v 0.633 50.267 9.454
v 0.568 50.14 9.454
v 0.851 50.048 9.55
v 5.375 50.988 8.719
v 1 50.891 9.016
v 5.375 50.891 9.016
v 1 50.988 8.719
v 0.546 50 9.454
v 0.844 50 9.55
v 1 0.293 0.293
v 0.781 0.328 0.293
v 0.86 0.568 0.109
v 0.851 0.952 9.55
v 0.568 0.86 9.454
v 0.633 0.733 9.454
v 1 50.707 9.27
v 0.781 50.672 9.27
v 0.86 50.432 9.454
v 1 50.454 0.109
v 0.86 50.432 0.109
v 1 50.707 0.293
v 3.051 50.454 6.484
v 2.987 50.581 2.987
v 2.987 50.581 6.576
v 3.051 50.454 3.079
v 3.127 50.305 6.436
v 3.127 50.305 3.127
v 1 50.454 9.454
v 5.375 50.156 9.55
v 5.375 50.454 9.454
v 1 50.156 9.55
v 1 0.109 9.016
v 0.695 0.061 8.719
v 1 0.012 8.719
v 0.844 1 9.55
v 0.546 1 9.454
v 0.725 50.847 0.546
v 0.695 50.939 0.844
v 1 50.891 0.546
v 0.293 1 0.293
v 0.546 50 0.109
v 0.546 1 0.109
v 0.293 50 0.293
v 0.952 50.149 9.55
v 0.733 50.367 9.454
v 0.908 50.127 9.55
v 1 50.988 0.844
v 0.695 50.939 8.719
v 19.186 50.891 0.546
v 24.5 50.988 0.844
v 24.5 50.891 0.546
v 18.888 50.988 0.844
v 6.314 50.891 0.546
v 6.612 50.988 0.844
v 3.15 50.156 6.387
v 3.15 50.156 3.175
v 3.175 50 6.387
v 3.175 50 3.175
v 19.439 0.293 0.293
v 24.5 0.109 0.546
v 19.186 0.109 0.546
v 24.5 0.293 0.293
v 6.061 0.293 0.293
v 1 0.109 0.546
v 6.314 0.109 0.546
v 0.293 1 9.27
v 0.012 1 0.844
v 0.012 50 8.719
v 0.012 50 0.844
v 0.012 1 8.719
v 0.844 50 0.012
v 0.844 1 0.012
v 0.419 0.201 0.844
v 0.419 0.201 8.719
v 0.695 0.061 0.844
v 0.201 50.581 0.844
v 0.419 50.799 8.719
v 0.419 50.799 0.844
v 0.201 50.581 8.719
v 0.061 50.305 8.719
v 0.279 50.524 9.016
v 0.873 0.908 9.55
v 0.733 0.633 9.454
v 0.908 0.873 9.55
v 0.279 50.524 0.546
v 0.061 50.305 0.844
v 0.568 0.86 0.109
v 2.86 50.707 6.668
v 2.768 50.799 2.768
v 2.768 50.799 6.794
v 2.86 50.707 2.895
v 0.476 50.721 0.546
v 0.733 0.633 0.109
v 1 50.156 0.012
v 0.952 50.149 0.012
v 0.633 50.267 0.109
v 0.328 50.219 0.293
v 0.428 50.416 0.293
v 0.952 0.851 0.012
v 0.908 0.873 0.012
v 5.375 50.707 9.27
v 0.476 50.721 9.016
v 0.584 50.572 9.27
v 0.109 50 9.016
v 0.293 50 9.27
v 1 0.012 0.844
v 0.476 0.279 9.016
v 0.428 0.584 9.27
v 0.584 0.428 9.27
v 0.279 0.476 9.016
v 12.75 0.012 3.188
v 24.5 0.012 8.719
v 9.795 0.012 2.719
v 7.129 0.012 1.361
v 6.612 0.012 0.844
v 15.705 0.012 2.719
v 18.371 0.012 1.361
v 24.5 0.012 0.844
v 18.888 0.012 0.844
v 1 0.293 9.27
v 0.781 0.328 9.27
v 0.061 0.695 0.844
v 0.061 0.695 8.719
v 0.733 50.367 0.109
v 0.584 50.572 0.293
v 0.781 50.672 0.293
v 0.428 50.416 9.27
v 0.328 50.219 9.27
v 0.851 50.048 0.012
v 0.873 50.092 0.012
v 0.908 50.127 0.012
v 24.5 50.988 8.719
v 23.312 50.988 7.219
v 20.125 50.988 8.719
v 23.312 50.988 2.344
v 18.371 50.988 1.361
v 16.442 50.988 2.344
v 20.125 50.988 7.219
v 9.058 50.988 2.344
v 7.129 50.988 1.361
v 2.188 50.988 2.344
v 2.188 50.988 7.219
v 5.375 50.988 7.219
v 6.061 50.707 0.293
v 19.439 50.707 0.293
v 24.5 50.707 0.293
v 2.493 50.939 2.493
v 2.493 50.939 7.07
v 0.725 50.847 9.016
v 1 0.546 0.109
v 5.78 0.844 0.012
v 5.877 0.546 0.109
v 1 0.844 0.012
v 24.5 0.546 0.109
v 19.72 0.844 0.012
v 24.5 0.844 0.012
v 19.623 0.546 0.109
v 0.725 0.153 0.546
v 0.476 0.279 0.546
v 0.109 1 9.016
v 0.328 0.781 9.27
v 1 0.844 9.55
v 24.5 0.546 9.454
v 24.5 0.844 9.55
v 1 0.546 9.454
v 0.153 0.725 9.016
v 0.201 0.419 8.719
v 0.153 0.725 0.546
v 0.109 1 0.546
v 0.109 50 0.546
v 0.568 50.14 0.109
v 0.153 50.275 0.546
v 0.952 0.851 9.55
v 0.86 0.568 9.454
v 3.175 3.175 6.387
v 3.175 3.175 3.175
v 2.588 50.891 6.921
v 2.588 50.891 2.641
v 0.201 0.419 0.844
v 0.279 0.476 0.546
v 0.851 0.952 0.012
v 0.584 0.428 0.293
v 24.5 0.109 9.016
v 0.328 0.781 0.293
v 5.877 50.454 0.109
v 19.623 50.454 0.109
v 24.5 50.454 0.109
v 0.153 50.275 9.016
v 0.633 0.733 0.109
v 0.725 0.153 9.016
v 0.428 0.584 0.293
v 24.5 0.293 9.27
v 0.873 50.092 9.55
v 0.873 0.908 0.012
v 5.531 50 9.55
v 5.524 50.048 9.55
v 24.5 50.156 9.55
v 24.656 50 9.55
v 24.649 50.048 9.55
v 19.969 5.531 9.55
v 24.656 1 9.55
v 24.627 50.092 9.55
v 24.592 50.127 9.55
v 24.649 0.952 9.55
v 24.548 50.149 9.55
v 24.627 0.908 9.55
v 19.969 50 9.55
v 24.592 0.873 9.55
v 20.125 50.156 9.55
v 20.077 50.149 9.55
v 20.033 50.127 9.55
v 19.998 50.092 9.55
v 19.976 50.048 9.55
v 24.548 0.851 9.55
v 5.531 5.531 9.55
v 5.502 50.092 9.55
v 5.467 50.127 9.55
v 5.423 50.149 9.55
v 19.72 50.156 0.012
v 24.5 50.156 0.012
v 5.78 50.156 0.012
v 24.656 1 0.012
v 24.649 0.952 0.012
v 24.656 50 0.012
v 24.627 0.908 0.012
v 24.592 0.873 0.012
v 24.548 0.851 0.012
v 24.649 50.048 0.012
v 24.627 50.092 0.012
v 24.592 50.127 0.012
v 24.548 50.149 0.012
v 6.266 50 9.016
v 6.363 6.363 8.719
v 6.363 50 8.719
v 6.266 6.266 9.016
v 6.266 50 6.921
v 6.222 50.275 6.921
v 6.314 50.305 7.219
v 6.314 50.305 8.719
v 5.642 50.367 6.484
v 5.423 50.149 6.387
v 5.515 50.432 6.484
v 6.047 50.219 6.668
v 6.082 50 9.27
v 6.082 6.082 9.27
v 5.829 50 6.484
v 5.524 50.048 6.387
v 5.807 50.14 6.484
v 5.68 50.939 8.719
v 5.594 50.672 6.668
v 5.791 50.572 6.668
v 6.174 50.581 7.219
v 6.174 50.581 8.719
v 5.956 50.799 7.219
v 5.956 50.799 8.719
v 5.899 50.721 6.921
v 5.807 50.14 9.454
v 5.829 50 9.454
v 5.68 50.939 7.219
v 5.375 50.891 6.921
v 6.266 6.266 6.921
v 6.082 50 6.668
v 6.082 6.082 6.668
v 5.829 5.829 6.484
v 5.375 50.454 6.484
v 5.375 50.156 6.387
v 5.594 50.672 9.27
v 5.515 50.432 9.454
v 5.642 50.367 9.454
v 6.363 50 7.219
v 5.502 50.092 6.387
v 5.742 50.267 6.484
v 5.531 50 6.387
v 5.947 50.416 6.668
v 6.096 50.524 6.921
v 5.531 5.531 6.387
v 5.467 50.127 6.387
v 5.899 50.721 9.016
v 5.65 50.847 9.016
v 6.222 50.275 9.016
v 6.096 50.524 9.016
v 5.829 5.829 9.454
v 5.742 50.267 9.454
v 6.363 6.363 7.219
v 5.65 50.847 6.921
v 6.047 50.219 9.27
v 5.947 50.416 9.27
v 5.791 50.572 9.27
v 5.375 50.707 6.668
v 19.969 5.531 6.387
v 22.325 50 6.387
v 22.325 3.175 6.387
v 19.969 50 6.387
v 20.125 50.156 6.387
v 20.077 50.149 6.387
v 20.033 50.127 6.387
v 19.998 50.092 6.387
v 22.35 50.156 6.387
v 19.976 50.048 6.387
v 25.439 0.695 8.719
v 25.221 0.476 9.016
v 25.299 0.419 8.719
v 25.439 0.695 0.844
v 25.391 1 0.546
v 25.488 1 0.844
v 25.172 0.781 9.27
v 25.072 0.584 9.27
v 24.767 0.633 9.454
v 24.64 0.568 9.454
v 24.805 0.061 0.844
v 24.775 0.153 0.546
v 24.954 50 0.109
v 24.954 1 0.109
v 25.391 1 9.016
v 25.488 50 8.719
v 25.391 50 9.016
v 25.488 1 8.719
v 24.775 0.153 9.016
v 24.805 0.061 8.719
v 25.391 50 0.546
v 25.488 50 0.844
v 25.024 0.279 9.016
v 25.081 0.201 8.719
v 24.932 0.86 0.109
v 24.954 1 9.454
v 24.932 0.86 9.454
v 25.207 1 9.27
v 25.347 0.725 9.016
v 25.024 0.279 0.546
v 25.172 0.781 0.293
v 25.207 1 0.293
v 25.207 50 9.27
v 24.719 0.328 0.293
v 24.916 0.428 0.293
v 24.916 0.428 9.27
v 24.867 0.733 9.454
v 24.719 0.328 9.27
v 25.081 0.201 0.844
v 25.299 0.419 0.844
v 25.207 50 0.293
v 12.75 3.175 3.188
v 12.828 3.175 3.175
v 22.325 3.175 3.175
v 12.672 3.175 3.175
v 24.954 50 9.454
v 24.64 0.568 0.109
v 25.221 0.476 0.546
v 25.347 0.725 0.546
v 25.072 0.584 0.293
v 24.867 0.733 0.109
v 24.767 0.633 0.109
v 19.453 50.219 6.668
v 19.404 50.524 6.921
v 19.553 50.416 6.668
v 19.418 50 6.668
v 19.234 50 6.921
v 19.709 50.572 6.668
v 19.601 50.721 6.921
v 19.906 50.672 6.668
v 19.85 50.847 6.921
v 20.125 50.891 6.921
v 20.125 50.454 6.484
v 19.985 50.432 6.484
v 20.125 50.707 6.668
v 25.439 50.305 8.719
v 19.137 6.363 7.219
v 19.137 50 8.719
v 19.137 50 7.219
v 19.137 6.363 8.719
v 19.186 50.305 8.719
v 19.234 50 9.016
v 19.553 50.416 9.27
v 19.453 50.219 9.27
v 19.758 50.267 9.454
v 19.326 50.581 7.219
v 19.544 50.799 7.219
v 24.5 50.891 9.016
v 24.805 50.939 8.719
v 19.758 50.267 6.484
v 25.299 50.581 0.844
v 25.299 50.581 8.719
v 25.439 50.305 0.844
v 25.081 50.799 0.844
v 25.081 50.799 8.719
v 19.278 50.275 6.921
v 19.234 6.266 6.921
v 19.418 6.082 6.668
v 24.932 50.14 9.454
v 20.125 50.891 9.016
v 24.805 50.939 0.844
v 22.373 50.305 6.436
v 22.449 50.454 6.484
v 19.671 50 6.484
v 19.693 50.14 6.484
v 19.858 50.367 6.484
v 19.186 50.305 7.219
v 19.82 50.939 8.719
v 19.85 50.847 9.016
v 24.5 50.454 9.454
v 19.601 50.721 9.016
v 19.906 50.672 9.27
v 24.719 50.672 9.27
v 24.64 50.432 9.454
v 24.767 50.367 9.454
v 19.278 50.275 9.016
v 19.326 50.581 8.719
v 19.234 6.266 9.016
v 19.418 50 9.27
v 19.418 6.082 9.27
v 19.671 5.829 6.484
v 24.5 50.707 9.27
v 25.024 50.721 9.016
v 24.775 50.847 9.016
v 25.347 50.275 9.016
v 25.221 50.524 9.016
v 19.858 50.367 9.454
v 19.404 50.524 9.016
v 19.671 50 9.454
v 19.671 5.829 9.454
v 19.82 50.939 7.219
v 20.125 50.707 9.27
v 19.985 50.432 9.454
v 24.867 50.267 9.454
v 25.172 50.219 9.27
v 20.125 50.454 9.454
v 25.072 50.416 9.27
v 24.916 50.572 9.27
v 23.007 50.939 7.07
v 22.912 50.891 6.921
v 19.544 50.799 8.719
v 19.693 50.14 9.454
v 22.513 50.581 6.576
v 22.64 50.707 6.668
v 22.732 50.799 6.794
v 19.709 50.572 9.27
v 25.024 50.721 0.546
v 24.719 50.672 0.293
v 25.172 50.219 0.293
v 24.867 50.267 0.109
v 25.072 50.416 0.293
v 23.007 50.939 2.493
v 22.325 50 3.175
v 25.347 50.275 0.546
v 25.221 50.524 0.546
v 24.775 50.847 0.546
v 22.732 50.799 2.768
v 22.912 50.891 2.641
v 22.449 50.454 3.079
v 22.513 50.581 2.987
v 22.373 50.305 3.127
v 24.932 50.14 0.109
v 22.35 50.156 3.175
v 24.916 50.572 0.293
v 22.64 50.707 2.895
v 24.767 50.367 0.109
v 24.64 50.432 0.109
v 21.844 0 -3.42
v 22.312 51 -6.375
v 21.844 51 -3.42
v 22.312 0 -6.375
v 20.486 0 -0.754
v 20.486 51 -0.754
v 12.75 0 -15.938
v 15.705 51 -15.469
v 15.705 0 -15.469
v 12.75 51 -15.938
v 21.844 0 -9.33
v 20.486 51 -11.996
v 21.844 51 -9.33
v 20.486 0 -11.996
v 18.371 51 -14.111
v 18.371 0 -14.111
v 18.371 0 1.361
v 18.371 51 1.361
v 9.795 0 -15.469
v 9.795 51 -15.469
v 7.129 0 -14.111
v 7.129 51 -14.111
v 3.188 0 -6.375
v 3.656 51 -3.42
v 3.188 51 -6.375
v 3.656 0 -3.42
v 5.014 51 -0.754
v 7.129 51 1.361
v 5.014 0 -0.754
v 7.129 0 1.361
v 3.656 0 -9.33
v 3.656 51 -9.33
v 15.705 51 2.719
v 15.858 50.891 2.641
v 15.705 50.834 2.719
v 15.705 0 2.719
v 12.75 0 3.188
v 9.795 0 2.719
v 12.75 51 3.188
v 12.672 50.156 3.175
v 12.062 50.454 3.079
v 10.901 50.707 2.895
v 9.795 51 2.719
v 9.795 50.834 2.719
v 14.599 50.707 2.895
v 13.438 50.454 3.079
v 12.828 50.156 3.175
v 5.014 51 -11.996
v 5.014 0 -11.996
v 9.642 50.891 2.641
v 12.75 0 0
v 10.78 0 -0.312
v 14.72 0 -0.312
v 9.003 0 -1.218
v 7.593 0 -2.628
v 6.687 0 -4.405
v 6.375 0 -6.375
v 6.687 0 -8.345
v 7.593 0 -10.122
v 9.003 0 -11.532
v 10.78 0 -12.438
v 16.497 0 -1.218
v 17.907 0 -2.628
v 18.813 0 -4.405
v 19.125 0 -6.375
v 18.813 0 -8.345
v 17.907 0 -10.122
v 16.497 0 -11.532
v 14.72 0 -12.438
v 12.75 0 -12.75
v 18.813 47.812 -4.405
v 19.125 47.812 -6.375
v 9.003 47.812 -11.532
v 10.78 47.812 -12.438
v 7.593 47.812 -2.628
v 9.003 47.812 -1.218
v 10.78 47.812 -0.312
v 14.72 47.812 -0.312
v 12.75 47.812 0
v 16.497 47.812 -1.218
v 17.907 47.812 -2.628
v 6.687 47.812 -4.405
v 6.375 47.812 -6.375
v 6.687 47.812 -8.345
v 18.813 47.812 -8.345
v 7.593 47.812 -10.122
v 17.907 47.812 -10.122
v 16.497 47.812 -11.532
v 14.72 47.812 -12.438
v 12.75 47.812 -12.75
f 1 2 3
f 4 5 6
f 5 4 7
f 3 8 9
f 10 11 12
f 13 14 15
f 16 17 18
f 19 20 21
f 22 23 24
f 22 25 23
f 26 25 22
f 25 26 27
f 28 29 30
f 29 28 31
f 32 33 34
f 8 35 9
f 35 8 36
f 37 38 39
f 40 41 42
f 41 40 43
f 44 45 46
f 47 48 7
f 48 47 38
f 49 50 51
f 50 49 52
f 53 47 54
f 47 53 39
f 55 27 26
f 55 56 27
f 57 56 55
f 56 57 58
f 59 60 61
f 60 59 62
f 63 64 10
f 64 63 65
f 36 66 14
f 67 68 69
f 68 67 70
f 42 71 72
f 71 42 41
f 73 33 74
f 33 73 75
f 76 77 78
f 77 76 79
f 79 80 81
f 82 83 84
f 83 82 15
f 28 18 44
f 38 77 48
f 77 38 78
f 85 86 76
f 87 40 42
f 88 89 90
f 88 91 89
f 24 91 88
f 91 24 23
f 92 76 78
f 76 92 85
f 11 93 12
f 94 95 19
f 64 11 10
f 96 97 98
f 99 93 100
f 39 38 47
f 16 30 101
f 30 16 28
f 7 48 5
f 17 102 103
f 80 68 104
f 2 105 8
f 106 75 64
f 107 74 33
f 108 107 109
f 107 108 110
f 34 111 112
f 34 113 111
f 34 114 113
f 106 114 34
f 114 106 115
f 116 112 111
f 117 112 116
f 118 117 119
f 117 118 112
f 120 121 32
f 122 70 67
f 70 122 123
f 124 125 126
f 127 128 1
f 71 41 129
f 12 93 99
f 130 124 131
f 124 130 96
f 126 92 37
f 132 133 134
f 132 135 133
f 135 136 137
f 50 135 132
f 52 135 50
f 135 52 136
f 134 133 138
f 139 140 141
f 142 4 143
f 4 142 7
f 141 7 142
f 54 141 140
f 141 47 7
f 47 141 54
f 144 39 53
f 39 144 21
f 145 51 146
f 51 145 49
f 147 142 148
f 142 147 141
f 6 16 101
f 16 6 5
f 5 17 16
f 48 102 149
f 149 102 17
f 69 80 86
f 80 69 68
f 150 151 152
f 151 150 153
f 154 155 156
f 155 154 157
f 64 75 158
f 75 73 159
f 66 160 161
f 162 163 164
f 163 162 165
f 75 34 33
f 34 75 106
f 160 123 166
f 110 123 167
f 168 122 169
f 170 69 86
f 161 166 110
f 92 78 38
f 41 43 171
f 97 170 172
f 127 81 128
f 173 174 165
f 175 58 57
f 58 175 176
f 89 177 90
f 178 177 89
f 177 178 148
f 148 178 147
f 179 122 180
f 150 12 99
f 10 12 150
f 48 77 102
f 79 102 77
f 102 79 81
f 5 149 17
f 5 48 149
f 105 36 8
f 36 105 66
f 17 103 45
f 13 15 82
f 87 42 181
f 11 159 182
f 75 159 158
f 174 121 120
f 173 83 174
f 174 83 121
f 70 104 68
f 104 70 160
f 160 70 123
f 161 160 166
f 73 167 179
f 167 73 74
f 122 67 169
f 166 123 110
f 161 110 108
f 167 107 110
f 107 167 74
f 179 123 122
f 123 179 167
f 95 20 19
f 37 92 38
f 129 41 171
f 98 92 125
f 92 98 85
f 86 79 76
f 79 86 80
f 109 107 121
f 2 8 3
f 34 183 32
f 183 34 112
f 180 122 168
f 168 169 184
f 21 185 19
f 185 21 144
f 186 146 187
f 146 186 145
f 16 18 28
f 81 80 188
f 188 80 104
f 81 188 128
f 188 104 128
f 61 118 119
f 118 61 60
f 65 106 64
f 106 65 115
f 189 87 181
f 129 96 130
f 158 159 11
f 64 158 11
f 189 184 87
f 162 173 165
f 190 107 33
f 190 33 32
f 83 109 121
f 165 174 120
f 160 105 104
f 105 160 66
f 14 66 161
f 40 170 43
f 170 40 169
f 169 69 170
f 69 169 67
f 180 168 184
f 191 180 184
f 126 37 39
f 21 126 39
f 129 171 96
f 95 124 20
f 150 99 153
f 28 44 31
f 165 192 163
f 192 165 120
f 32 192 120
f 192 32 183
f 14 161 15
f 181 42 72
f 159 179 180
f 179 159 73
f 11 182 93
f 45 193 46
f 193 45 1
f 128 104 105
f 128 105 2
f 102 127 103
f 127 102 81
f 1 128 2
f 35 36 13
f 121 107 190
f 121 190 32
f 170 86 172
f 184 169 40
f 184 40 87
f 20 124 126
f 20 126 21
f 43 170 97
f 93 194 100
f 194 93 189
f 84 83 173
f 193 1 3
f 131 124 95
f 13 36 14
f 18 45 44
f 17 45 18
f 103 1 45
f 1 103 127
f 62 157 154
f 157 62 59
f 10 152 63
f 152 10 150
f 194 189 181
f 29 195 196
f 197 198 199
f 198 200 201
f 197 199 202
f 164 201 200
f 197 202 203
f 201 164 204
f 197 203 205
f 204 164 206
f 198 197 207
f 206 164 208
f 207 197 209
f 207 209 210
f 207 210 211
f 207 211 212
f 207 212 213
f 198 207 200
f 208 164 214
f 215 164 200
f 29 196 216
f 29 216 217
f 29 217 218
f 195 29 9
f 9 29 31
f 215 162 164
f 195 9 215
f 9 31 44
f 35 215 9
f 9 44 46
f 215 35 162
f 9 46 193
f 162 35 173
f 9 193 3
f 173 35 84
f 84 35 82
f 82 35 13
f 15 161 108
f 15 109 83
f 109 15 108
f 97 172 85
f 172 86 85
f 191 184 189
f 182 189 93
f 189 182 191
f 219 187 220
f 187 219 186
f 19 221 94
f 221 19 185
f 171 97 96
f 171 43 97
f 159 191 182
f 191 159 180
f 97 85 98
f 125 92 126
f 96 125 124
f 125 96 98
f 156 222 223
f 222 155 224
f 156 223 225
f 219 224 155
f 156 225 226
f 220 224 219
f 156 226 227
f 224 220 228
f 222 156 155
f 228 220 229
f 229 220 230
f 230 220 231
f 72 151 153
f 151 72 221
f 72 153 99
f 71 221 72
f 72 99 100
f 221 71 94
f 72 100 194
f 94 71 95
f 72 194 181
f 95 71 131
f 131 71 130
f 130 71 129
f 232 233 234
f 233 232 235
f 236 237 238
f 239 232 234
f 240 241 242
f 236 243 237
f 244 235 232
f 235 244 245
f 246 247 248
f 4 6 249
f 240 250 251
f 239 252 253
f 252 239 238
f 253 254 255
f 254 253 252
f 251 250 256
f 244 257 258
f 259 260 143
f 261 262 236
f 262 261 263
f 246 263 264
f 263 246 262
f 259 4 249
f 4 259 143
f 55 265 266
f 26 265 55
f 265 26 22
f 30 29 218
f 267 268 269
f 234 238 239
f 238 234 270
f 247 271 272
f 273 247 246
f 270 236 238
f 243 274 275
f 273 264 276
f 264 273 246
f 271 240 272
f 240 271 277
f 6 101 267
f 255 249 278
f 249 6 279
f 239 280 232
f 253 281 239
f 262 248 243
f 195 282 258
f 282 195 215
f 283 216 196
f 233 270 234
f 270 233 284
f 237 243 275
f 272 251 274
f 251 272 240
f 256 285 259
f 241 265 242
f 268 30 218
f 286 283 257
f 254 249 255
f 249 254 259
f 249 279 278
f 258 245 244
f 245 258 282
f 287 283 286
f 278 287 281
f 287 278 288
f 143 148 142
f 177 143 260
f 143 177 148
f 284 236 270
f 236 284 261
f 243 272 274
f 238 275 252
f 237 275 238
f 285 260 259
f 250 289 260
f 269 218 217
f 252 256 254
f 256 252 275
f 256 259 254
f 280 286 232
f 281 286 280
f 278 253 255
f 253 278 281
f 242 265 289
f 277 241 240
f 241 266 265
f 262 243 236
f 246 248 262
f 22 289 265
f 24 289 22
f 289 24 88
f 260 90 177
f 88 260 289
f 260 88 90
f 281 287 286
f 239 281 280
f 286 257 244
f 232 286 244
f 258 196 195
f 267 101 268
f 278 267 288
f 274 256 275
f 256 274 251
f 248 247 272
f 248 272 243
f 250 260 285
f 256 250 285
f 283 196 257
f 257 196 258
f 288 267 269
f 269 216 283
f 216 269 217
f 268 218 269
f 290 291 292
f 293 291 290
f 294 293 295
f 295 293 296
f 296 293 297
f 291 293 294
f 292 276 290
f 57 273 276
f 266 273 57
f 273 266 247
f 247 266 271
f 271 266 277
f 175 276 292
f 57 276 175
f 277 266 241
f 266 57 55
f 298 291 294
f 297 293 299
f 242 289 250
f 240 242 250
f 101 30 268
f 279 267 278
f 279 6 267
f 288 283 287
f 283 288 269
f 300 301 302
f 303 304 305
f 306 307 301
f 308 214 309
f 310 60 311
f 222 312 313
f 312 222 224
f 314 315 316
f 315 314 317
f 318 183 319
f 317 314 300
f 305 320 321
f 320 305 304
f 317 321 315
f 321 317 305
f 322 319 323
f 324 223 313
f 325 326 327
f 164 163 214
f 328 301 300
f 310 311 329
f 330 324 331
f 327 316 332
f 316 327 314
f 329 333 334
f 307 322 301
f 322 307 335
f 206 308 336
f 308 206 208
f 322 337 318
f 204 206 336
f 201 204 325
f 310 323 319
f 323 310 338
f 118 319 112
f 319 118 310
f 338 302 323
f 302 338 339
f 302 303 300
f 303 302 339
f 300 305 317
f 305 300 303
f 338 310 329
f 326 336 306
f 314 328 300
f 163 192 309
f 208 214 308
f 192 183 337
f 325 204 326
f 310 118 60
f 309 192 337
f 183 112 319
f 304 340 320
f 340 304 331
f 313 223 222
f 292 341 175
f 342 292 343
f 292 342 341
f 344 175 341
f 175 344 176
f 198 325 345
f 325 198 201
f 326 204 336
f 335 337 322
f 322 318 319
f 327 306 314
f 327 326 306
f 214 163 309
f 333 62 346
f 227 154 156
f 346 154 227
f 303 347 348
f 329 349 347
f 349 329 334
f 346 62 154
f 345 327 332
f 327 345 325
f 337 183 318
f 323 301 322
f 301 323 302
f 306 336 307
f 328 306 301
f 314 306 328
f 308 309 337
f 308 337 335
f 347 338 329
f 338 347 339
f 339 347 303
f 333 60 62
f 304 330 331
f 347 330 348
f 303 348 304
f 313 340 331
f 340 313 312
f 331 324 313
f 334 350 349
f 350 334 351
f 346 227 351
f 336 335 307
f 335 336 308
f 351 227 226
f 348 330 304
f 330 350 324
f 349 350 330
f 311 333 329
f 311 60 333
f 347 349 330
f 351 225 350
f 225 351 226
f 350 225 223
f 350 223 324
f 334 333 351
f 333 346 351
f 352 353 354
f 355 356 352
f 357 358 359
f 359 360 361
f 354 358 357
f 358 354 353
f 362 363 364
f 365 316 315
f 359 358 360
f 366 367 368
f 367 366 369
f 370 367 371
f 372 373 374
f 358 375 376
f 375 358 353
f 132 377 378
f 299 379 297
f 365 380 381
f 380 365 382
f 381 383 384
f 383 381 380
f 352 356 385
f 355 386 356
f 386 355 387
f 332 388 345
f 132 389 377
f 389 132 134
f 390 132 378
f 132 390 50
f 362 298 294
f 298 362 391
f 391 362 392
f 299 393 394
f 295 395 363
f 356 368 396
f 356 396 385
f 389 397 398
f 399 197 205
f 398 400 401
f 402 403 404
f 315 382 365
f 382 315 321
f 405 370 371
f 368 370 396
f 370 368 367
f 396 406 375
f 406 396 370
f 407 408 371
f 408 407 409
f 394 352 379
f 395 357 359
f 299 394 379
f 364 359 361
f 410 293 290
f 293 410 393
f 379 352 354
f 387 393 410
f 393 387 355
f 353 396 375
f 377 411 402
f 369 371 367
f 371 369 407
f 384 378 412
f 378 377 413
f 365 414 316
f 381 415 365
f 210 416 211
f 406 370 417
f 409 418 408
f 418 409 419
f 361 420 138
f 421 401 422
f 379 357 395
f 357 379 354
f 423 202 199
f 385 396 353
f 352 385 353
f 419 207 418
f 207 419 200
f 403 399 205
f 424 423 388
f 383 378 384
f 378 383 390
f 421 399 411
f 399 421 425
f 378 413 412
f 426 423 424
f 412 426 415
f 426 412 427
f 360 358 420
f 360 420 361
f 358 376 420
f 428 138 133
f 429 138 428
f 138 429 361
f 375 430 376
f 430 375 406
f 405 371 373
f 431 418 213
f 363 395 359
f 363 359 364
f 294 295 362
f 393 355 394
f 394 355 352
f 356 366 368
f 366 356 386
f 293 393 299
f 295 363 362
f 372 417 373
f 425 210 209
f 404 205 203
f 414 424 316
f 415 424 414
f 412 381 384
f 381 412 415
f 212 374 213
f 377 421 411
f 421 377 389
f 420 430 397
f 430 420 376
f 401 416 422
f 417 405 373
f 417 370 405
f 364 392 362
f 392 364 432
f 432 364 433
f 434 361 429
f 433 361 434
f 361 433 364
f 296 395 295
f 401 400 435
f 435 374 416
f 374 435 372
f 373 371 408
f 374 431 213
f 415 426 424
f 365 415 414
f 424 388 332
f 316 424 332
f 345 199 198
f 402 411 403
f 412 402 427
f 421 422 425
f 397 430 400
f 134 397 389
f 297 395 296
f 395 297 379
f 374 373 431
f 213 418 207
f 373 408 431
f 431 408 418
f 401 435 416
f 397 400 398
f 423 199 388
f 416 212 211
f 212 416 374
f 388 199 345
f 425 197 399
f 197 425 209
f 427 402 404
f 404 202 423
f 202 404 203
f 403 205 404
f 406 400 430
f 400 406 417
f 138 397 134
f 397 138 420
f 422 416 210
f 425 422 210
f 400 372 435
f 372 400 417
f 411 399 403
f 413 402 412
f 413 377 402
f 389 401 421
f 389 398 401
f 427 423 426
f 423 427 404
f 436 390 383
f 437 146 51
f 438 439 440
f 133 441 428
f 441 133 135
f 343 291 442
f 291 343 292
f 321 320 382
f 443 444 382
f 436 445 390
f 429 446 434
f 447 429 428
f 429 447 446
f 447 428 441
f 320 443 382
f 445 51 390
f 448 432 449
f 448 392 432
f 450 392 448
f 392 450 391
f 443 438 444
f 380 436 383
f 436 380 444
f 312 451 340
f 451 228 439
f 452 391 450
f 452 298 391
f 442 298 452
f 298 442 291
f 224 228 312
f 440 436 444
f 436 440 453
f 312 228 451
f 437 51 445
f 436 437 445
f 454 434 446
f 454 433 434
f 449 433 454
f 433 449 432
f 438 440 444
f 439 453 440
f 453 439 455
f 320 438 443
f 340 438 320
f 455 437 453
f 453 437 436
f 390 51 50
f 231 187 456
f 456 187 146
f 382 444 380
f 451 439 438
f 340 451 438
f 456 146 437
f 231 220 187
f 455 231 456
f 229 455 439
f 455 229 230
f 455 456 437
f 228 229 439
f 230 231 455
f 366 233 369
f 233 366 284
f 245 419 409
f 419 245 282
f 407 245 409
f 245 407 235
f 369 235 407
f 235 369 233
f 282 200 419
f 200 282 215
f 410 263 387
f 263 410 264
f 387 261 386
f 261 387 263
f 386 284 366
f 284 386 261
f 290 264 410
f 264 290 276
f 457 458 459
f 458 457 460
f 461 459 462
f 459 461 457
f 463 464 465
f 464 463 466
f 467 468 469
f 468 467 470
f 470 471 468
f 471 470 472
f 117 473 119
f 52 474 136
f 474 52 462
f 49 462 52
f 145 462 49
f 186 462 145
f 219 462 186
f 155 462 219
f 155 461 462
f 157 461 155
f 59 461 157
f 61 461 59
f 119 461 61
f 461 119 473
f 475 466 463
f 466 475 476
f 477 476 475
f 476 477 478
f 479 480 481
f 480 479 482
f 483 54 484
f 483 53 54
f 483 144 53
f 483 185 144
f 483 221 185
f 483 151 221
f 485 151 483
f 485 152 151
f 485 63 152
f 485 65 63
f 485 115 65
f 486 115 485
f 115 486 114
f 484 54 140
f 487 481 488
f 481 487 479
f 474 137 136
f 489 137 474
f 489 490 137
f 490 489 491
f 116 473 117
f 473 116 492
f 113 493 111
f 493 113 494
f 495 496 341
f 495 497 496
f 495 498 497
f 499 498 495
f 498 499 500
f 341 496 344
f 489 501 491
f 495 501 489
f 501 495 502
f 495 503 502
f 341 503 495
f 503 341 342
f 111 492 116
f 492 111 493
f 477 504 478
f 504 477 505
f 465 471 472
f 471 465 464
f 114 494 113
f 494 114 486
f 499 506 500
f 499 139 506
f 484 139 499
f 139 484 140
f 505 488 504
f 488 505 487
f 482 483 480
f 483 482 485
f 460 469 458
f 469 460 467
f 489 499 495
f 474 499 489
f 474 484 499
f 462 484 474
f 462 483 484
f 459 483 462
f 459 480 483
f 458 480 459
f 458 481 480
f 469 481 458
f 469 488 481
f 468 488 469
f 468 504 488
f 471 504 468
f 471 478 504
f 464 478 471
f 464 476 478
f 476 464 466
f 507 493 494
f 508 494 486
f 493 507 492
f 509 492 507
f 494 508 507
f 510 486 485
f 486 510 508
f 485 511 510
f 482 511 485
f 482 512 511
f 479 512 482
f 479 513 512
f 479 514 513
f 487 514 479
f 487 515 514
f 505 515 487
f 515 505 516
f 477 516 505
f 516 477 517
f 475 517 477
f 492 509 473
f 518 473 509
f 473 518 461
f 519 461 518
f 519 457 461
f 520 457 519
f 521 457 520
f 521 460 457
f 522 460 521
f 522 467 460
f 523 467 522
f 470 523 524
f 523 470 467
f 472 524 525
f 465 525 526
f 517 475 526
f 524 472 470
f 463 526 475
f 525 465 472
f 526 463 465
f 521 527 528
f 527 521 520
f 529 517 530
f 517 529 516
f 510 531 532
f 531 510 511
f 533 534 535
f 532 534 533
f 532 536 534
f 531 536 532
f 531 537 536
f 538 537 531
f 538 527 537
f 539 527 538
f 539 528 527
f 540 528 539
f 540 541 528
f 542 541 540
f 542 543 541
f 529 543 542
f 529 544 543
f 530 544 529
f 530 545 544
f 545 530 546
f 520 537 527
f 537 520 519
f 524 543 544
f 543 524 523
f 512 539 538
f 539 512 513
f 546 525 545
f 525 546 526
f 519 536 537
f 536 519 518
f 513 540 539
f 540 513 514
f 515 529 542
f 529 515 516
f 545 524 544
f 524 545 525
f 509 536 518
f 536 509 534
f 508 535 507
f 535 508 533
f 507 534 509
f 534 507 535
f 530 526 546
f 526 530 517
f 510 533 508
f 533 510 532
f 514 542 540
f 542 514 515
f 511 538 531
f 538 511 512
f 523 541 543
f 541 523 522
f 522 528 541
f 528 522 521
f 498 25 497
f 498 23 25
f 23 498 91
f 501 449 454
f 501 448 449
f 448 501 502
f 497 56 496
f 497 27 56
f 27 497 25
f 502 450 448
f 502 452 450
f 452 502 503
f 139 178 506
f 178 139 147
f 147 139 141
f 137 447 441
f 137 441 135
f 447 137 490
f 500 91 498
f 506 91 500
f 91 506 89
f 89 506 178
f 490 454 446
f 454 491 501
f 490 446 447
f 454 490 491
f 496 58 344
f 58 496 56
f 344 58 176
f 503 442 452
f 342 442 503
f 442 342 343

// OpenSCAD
//fine = true; 
fine = false; 

$fn = fine ? 100 : 20;

roundcorner = 2; 

horn_arc = 45;

horn_diameter = 5;

base_size = 25.5;
plate_thickness = base_size / 8;


module pad() {
    color("orange") 
    translate([((base_size / 8) * 2) + (roundcorner / 2), ((base_size / 8) * 2) + (roundcorner / 2), roundcorner / 2]) {
        minkowski() {
            cube([((base_size / 8) * 4) - roundcorner, ((base_size / 8) * 4) - roundcorner, (2 * plate_thickness) - roundcorner]);
            sphere(d = roundcorner);
        }
    }



    translate([base_size / 2, base_size / 2, 2 * plate_thickness])

    translate([10, 0, 0]){
        color("green") rotate([90, 180 + 45, 0]) {
            rotate_extrude(angle=horn_arc) {
                translate([10, 0]) {
                    circle(d = horn_diameter);
                }
            }
            translate([10,0, 0]) {
                color("purple") sphere(d = horn_diameter);
            }
        }
    }

}


module base() {
    color("purple") 
    translate([((base_size / 8) * 1) + (roundcorner / 2), ((base_size / 8) * 1) + (roundcorner / 2), (roundcorner / 2)]) {
        minkowski() {
            cube([((base_size / 8) * 6) - roundcorner, ((base_size / 8) * 6) - roundcorner, plate_thickness - roundcorner]);
            sphere(d = roundcorner);
        }
    }
}
    
module plate() {
    color("red") 
    translate([((base_size / 8) * 0) + (roundcorner / 2), ((base_size / 8) * 0) + (roundcorner / 2), (roundcorner / 2)]) {
        minkowski() {
            cube([((base_size / 8) * 8) - roundcorner, ((base_size / 8) * 8) - roundcorner, plate_thickness - roundcorner]);
            sphere(d = roundcorner);
        }
    }
}
module plate2() {
    color("red") 
    translate([((base_size / 8) * 0) + (roundcorner / 2), ((base_size / 8) * 0) + (roundcorner / 2), (roundcorner / 2)]) {
        minkowski() {
            cube([((base_size / 8) * 8) - roundcorner, ((base_size / 8) * 8 * 2) - roundcorner, plate_thickness - roundcorner]);
            sphere(d = roundcorner);
        }
    }
}

module rail() {
    color("grey") translate([((base_size / 8) * 0) + (roundcorner / 2), ((base_size / 8) * 0) + (roundcorner / 2), (roundcorner / 2)]) {
        minkowski() {
            cube([((base_size / 8) * 1) - roundcorner, ((base_size / 8) * 8) - roundcorner, (plate_thickness * 3) - roundcorner]);
            sphere(d = roundcorner);
        }
    }
    color("orange") translate([((base_size / 8) * 0) + (roundcorner / 2), ((base_size / 8) * 0) + (roundcorner / 2), (plate_thickness * 2)+ (roundcorner / 2)]) {
        minkowski() {
            cube([((base_size / 8) * 2) - roundcorner, ((base_size / 8) * 8) - roundcorner, (plate_thickness * 1) - roundcorner]);
            sphere(d = roundcorner);
        }
    }
    
    
    color("grey") translate([((base_size / 8) * 0) + (roundcorner / 2), ((base_size / 8) * 0) + (roundcorner / 2), (roundcorner / 2)]) {
        minkowski() {
            cube([((base_size / 8) * 8) - roundcorner, ((base_size / 8) * 1) - roundcorner, (plate_thickness * 3) - roundcorner]);
            sphere(d = roundcorner);
        }
    }
    color("orange") translate([((base_size / 8) * 6) + (roundcorner / 2), ((base_size / 8) * 0) + (roundcorner / 2), (plate_thickness * 2) + (roundcorner / 2)]) {
        minkowski() {
            cube([((base_size / 8) * 2) - roundcorner, ((base_size / 8) * 8) - roundcorner, (plate_thickness * 1) - roundcorner]);
            sphere(d = roundcorner);
        }
    }
    
    
    
    color("grey") translate([((base_size / 8) * 7) + (roundcorner / 2), ((base_size / 8) * 0) + (roundcorner / 2), (roundcorner / 2)]) {
        minkowski() {
            cube([((base_size / 8) * 1) - roundcorner, ((base_size / 8) * 8) - roundcorner, (plate_thickness * 3) - roundcorner]);
            sphere(d = roundcorner);
        }
    }
        color("orange") translate([((base_size / 8) * 0) + (roundcorner / 2), ((base_size / 8) * 0) + (roundcorner / 2), (plate_thickness * 2) + (roundcorner / 2)]) {
        minkowski() {
            cube([((base_size / 8) * 8) - roundcorner, ((base_size / 8) * 2) - roundcorner, (plate_thickness * 1) - roundcorner]);
            sphere(d = roundcorner);
        }
    }
}



module rail2() {
    color("grey") translate([((base_size / 8) * 0) + (roundcorner / 2), ((base_size / 8) * 0) + (roundcorner / 2), (roundcorner / 2)]) {
        minkowski() {
            cube([((base_size / 8) * 1) - roundcorner, ((base_size / 8) * 8 *2) - roundcorner, (plate_thickness * 3) - roundcorner]);
            sphere(d = roundcorner);
        }
    }
    color("orange") translate([((base_size / 8) * 0) + (roundcorner / 2), ((base_size / 8) * 0) + (roundcorner / 2), (plate_thickness * 2)+ (roundcorner / 2)]) {
        minkowski() {
            cube([((base_size / 8) * 2) - roundcorner, ((base_size / 8) * 8 * 2) - roundcorner, (plate_thickness * 1) - roundcorner]);
            sphere(d = roundcorner);
        }
    }
    
    
    color("grey") translate([((base_size / 8) * 0) + (roundcorner / 2), ((base_size / 8) * 0) + (roundcorner / 2), (roundcorner / 2)]) {
        minkowski() {
            cube([((base_size / 8) * 8) - roundcorner, ((base_size / 8) * 1) - roundcorner, (plate_thickness * 3) - roundcorner]);
            sphere(d = roundcorner);
        }
    }
    color("orange") translate([((base_size / 8) * 6) + (roundcorner / 2), ((base_size / 8) * 0) + (roundcorner / 2), (plate_thickness * 2) + (roundcorner / 2)]) {
        minkowski() {
            cube([((base_size / 8) * 2) - roundcorner, ((base_size / 8) * 8 * 2) - roundcorner, (plate_thickness * 1) - roundcorner]);
            sphere(d = roundcorner);
        }
    }
    
    
    
    color("grey") translate([((base_size / 8) * 7) + (roundcorner / 2), ((base_size / 8) * 0) + (roundcorner / 2), (roundcorner / 2)]) {
        minkowski() {
            cube([((base_size / 8) * 1) - roundcorner, ((base_size / 8) * 8 * 2) - roundcorner, (plate_thickness * 3) - roundcorner]);
            sphere(d = roundcorner);
        }
    }
        color("orange") translate([((base_size / 8) * 0) + (roundcorner / 2), ((base_size / 8) * 0) + (roundcorner / 2), (plate_thickness * 2) + (roundcorner / 2)]) {
        minkowski() {
            cube([((base_size / 8) * 8) - roundcorner, ((base_size / 8) * 2) - roundcorner, (plate_thickness * 1) - roundcorner]);
            sphere(d = roundcorner);
        }
    }
}




module base3() {
    color("blue") hull() {
        base();
        translate([0, base_size, 0]) base();
    }
}

//pad();
//translate([0, base_size, 0]) pad();
//base2();
//base3();

plate2();
rail2();

tube_id = base_size / 2;
tube_od = tube_id + (plate_thickness * 2);

translate([base_size / 2, base_size * 2, - ((tube_od / 2) - plate_thickness)] ) {
    rotate([90, 0, 0]) {
difference() {
        cylinder(d = tube_od, h = base_size * 2);
        translate([0, 0, plate_thickness + 0.001])
        cylinder(d = tube_id, h = (base_size * 2) - plate_thickness);
}
    }
}
